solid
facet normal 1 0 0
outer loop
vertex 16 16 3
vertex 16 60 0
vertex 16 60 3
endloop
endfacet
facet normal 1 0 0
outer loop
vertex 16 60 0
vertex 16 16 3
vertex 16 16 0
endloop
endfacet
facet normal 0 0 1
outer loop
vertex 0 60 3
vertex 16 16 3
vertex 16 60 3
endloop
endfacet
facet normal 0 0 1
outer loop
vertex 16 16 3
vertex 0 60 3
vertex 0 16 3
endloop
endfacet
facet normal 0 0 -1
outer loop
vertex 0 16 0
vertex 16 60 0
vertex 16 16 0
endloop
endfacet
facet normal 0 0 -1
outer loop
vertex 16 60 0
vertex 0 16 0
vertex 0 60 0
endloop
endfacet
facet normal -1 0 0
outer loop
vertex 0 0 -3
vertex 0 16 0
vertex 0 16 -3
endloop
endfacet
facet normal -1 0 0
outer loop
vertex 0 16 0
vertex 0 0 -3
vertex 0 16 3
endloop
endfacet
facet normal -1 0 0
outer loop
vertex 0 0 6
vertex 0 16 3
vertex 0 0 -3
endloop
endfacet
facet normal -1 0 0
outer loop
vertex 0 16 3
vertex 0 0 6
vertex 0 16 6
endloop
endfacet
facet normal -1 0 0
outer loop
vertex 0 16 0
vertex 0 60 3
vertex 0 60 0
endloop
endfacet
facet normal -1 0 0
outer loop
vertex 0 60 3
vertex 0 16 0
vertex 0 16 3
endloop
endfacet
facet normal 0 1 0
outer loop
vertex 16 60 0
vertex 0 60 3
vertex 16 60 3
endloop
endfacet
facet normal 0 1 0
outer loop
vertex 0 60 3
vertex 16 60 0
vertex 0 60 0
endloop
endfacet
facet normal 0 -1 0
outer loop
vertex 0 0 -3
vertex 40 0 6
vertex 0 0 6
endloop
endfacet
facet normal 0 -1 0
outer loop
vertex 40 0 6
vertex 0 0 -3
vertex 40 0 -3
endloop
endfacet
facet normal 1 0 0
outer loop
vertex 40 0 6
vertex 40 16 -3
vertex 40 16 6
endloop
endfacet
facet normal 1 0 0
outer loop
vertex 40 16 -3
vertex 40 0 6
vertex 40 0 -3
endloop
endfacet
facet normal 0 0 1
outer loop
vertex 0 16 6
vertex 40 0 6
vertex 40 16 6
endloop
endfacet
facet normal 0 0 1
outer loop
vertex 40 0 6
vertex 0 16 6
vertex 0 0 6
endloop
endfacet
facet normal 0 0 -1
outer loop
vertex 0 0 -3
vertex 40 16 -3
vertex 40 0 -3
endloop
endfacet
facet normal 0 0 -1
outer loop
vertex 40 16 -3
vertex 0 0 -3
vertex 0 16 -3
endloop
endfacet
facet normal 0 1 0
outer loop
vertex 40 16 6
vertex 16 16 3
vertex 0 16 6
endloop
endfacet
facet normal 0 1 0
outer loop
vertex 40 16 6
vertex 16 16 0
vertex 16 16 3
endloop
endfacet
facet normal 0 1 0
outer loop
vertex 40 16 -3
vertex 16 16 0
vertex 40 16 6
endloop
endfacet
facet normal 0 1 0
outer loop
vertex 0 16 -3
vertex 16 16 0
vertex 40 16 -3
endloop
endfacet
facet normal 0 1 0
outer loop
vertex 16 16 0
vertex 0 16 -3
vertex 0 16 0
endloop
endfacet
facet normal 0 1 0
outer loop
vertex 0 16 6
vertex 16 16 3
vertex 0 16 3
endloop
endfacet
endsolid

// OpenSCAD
$arm=60;
$crosspiece=40;
$width=16;

tinySquare($arm,$crosspiece,$width);

module tinySquare(arm,crosspiece,width){
union(){
cube([width,arm,3]);
translate([0,0,-3])cube([crosspiece,width,9]);
}
}
